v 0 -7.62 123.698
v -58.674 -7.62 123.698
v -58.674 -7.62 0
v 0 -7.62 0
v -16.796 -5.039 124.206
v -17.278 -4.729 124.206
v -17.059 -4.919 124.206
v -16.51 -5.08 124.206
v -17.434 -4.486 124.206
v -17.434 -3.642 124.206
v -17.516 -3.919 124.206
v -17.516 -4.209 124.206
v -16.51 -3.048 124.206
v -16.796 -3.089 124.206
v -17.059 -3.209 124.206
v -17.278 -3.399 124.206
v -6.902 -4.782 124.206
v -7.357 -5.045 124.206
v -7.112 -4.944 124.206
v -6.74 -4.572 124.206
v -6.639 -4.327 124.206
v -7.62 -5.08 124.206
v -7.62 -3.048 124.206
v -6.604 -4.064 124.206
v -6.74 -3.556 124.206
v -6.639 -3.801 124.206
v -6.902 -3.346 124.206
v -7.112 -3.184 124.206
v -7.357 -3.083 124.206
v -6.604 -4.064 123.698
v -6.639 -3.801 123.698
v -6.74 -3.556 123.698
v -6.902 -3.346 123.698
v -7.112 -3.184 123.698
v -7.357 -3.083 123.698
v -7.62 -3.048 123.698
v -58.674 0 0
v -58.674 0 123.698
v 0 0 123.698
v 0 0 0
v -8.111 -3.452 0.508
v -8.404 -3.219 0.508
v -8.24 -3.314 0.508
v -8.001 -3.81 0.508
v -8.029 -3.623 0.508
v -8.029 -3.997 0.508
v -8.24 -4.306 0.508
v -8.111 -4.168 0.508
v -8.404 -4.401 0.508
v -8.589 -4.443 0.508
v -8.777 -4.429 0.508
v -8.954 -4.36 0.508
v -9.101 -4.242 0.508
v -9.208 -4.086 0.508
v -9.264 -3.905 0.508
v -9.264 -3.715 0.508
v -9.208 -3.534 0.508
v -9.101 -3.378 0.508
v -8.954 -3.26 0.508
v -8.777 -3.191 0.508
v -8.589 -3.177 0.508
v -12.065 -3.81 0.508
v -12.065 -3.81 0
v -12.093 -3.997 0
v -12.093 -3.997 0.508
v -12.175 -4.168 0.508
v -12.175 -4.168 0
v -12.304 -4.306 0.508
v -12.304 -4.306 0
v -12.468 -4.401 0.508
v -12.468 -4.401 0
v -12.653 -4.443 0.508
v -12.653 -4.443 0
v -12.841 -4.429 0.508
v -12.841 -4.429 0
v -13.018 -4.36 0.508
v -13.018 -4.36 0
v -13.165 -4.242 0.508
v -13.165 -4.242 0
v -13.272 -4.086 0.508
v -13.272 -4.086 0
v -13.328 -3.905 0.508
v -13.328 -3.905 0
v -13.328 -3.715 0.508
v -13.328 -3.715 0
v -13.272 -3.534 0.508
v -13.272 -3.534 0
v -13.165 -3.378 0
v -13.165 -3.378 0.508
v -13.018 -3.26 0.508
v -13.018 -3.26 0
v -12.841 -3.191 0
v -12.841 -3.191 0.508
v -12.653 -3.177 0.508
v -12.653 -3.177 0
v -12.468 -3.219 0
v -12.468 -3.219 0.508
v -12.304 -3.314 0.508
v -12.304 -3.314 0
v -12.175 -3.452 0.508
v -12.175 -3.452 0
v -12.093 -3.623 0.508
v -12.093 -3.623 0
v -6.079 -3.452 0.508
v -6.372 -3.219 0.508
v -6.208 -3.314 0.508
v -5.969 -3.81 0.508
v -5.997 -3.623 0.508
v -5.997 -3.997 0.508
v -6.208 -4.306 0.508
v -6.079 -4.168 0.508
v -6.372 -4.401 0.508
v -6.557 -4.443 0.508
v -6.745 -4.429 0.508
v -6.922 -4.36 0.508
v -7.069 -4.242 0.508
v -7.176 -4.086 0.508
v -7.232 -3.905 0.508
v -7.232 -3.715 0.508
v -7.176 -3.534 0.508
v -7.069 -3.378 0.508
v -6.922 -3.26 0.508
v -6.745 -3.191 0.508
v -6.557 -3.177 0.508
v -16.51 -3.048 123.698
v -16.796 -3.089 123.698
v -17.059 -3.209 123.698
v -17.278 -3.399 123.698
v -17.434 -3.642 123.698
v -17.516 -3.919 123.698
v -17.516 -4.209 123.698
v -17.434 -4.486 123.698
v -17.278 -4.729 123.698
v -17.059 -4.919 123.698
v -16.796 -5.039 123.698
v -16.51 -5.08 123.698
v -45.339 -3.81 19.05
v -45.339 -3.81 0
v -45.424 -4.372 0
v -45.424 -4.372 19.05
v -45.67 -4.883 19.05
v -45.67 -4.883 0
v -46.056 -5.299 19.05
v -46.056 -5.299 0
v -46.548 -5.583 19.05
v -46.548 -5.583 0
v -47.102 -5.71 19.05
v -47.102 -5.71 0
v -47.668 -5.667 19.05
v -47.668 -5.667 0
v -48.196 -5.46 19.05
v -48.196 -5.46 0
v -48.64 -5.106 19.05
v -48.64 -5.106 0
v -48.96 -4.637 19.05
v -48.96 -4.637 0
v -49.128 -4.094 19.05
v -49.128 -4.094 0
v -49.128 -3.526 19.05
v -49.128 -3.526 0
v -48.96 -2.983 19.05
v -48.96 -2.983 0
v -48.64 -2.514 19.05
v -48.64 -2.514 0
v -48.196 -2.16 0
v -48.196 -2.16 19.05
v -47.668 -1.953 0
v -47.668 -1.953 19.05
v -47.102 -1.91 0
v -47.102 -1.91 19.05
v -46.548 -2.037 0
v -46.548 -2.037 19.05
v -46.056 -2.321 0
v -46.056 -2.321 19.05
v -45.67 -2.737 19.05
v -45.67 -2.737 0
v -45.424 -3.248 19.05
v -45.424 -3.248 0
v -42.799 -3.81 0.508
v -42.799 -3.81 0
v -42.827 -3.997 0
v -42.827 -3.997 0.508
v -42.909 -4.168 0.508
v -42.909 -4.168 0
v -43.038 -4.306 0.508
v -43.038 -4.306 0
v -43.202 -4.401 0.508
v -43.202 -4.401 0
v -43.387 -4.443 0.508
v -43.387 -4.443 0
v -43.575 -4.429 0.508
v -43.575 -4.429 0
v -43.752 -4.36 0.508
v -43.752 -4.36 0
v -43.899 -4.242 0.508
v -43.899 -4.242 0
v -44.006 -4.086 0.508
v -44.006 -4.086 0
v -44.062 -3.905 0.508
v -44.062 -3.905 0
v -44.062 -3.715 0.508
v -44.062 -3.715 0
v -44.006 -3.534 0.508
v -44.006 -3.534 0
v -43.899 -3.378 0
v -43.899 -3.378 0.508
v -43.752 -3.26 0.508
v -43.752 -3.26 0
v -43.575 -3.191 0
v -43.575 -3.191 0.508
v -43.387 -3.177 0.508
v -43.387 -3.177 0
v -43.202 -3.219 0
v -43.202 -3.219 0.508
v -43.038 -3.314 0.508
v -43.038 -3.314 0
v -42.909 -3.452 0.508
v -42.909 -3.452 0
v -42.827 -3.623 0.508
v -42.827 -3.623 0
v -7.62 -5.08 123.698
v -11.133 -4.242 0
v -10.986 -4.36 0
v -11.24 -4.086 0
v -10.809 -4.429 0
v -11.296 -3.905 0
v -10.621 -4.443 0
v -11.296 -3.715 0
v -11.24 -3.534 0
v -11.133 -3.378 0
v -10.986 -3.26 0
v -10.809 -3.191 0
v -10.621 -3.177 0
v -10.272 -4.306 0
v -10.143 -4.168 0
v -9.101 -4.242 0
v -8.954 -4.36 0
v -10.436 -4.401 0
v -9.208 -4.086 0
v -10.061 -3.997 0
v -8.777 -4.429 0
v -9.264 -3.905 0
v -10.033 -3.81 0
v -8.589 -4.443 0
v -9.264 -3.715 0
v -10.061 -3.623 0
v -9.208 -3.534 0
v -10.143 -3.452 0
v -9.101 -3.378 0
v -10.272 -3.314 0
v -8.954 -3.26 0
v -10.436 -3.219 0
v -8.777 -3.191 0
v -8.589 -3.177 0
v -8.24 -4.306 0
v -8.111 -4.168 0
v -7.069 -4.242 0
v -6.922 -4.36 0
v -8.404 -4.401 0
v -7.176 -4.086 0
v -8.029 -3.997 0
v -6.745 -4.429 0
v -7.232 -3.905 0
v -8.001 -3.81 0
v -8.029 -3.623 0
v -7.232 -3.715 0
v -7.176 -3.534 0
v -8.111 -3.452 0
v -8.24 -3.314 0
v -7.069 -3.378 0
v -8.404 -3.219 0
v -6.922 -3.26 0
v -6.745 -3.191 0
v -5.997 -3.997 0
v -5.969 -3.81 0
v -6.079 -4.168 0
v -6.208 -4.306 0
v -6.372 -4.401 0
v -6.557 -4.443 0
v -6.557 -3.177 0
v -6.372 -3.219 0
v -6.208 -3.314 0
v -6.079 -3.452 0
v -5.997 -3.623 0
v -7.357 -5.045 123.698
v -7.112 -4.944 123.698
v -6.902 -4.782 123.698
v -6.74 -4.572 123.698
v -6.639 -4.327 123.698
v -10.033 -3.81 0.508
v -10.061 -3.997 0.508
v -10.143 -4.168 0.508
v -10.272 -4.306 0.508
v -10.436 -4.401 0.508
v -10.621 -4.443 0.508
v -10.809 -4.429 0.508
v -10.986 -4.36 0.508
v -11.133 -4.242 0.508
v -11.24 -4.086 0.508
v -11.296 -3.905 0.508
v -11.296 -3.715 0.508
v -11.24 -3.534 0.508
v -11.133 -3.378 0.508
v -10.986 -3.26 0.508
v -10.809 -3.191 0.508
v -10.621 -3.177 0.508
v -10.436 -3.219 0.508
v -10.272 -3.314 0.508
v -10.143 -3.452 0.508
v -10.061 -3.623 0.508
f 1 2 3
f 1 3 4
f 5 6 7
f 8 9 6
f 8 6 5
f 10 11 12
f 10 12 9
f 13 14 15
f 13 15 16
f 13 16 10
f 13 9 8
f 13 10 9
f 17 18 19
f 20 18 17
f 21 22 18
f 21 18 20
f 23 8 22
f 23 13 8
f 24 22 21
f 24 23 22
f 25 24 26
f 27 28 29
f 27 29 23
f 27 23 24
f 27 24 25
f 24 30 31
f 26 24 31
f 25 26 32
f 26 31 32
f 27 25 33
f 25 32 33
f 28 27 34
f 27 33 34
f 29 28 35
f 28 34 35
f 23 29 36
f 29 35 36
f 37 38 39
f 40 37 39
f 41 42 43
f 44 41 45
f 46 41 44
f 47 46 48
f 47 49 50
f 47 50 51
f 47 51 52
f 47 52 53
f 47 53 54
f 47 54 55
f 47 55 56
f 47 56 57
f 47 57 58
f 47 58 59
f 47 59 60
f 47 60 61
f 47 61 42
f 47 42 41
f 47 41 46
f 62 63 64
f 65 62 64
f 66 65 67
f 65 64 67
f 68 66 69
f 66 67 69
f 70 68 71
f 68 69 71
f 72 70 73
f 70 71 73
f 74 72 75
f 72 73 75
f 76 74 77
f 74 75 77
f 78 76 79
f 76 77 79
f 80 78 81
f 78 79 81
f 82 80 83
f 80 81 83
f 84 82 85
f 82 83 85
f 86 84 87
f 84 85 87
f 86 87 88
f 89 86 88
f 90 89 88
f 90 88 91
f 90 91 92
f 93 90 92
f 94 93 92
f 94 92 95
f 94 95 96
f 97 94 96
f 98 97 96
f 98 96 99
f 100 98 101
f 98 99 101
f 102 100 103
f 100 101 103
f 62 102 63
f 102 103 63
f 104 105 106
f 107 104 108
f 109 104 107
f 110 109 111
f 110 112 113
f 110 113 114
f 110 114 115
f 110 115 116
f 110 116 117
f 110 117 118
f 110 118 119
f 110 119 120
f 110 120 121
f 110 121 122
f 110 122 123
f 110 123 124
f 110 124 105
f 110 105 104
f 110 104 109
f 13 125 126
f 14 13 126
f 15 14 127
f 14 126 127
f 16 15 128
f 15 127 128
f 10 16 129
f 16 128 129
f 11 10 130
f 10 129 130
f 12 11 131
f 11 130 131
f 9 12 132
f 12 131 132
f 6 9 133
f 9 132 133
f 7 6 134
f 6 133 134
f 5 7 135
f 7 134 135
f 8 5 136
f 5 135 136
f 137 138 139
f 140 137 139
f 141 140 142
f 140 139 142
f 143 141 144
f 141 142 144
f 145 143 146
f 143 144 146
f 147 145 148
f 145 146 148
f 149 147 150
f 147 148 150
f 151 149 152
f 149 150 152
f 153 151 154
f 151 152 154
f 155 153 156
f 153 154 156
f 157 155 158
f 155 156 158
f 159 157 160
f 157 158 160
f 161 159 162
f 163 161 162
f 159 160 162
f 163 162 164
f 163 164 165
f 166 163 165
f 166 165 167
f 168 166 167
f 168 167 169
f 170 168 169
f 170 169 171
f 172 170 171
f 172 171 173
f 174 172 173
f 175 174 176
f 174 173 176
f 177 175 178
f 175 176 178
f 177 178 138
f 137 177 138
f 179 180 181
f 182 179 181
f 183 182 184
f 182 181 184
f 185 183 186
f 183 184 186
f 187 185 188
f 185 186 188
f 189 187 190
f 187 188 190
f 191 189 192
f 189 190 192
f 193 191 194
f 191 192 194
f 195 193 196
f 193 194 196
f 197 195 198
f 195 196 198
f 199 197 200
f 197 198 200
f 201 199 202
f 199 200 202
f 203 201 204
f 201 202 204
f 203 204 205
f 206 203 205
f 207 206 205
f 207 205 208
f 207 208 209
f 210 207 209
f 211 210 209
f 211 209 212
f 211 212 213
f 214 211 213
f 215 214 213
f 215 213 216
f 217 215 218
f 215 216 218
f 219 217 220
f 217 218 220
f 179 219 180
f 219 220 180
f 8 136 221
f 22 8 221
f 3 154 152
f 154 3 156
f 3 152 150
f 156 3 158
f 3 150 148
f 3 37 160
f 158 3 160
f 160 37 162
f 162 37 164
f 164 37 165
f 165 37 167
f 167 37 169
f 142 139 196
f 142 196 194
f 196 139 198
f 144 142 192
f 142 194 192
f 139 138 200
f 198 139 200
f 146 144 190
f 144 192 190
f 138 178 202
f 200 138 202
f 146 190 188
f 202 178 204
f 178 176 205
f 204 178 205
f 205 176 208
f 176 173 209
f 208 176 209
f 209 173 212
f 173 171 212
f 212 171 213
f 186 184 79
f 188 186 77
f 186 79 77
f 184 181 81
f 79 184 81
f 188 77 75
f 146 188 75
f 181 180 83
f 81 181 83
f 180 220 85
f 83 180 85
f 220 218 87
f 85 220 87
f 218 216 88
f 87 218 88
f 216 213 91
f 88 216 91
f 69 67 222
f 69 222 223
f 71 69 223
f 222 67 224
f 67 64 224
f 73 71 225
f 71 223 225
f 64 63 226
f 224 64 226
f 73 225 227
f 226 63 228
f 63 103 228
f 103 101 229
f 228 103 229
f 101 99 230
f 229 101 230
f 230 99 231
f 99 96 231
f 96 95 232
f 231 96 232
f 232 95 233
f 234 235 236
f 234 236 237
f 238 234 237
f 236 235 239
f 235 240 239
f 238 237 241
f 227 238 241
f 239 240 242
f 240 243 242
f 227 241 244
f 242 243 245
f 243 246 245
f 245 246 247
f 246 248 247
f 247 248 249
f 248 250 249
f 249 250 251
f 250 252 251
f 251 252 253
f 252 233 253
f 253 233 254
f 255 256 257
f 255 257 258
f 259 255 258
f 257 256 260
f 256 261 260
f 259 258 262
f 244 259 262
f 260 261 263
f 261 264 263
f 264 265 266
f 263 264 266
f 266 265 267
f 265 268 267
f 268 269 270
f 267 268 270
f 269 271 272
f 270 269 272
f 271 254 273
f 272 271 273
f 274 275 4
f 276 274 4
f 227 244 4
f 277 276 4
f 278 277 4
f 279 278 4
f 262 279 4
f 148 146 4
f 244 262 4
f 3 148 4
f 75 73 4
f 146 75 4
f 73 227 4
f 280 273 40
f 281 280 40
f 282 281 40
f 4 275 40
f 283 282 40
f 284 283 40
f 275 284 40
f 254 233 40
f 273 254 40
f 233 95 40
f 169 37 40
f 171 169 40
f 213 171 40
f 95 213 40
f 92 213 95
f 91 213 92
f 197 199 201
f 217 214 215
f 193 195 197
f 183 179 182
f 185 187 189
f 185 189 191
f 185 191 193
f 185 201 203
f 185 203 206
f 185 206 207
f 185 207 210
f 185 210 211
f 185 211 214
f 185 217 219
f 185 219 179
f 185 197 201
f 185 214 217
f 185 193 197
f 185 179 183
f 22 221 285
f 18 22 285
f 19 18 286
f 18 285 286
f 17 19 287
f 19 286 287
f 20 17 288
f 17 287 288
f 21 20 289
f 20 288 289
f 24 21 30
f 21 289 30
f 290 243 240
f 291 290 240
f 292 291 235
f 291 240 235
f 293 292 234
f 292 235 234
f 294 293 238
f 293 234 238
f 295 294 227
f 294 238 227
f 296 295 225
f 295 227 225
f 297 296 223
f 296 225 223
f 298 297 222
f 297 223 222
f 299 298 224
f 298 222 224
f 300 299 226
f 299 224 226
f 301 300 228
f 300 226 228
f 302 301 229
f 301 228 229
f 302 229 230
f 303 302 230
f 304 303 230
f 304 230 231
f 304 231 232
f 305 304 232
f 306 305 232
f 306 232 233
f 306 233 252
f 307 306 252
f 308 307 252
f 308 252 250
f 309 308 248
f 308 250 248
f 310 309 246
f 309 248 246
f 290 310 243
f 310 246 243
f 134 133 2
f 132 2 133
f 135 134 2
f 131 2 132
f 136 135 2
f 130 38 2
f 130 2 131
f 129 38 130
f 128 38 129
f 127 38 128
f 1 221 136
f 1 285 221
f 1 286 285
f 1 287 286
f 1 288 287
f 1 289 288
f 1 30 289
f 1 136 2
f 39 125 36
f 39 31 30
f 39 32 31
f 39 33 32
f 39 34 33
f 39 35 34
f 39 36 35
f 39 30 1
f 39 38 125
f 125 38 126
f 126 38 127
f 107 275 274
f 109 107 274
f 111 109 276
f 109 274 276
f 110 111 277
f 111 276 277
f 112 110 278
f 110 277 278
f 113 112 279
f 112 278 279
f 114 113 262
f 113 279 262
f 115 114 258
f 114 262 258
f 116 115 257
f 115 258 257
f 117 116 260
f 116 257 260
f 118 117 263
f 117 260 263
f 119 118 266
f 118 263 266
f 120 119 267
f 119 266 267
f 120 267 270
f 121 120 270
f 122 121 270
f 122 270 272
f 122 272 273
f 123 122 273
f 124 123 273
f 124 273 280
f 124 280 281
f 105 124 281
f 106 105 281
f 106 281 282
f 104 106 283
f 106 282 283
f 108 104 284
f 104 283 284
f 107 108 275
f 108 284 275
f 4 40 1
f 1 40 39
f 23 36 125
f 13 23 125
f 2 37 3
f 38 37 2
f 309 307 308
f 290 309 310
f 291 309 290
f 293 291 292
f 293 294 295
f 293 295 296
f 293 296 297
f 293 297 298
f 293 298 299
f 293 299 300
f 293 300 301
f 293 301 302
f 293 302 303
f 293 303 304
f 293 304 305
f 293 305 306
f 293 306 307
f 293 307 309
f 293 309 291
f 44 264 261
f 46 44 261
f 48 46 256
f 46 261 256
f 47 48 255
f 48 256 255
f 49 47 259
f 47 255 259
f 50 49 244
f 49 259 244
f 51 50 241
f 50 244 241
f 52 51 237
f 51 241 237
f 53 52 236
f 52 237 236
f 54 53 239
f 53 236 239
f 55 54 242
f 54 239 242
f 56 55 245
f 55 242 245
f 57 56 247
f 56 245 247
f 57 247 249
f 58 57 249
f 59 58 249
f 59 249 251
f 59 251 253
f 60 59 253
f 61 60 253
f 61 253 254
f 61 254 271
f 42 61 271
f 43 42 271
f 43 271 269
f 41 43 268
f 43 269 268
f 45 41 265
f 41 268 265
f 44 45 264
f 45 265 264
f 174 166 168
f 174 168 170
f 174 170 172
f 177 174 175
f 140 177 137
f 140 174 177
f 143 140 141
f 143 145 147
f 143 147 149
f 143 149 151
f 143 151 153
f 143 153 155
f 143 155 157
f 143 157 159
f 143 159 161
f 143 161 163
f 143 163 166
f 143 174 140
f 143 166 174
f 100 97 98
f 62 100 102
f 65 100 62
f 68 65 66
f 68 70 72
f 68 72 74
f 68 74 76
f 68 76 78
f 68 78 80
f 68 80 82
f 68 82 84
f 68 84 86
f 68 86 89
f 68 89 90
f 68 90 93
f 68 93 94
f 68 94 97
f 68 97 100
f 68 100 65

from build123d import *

# Parameters (mm, degrees)
F0_W     = 58.674
F0_H     = 123.698
F1_DEPTH = 7.62
F3_DEPTH = 0.508
F4_R     = 1.905
F5_DEPTH = 19.05
F6_R     = 0.635
F7_DEPTH = 0.508


with BuildPart() as f1:
    # F0 (on Front) → F1 (new body)
    with BuildSketch(Plane.XZ):
        with Locations((-29.337, 61.849)):
            Rectangle(F0_W, F0_H)
    extrude(amount=F1_DEPTH)

    # F2 (on face) → F3 (join)
    with BuildSketch(Plane.XY.offset(123.698)):
        with BuildLine():
            ThreePointArc((-15.494, -4.064), (-15.7915795103, -4.7824204897), (-16.51, -5.08))
            Line((-16.51, -5.08), (-7.62, -5.08))
            ThreePointArc((-7.62, -5.08), (-8.636, -4.064), (-7.62, -3.048))
            Line((-7.62, -3.048), (-16.51, -3.048))
            ThreePointArc((-16.51, -3.048), (-15.7915795103, -3.3455795103), (-15.494, -4.064))
        make_face()
        with BuildLine():
            ThreePointArc((-16.51, -3.048), (-17.526, -4.064), (-16.51, -5.08))
            Line((-16.51, -5.08), (-16.51, -3.048))
        make_face()
        with BuildLine():
            Line((-16.51, -3.048), (-16.51, -5.08))
            ThreePointArc((-16.51, -5.08), (-15.7915795103, -4.7824204897), (-15.494, -4.064))
            ThreePointArc((-15.494, -4.064), (-15.7915795103, -3.3455795103), (-16.51, -3.048))
        make_face()
        with BuildLine():
            ThreePointArc((-7.62, -3.048), (-8.636, -4.064), (-7.62, -5.08))
            Line((-7.62, -5.08), (-7.62, -3.048))
        make_face()
        with BuildLine():
            Line((-7.62, -3.048), (-7.62, -5.08))
            ThreePointArc((-7.62, -5.08), (-6.9015795103, -4.7824204897), (-6.604, -4.064))
            ThreePointArc((-6.604, -4.064), (-6.9015795103, -3.3455795103), (-7.62, -3.048))
        make_face()
    extrude(amount=F3_DEPTH)

    # F4 (on face) → F5 (cut)
    with BuildSketch(Plane(origin=(0, 0, 0), x_dir=(1, 0, 0), z_dir=(0, 0, -1))):
        with Locations((-47.244, 3.81)):
            Circle(F4_R)
    extrude(amount=-F5_DEPTH, mode=Mode.SUBTRACT)

    # F6 (on face) → F7 (cut)
    with BuildSketch(Plane(origin=(0, 0, 0), x_dir=(1, 0, 0), z_dir=(0, 0, -1))):
        with Locations((-43.434, 3.8100001402)):
            Circle(F6_R)
        with Locations((-12.7, 3.81)):
            Circle(F6_R)
        with Locations((-10.668, 3.81)):
            Circle(F6_R)
        with Locations((-8.636, 3.81)):
            Circle(F6_R)
        with Locations((-6.604, 3.81)):
            Circle(F6_R)
    extrude(amount=-F7_DEPTH, mode=Mode.SUBTRACT)


solid = f1.part
